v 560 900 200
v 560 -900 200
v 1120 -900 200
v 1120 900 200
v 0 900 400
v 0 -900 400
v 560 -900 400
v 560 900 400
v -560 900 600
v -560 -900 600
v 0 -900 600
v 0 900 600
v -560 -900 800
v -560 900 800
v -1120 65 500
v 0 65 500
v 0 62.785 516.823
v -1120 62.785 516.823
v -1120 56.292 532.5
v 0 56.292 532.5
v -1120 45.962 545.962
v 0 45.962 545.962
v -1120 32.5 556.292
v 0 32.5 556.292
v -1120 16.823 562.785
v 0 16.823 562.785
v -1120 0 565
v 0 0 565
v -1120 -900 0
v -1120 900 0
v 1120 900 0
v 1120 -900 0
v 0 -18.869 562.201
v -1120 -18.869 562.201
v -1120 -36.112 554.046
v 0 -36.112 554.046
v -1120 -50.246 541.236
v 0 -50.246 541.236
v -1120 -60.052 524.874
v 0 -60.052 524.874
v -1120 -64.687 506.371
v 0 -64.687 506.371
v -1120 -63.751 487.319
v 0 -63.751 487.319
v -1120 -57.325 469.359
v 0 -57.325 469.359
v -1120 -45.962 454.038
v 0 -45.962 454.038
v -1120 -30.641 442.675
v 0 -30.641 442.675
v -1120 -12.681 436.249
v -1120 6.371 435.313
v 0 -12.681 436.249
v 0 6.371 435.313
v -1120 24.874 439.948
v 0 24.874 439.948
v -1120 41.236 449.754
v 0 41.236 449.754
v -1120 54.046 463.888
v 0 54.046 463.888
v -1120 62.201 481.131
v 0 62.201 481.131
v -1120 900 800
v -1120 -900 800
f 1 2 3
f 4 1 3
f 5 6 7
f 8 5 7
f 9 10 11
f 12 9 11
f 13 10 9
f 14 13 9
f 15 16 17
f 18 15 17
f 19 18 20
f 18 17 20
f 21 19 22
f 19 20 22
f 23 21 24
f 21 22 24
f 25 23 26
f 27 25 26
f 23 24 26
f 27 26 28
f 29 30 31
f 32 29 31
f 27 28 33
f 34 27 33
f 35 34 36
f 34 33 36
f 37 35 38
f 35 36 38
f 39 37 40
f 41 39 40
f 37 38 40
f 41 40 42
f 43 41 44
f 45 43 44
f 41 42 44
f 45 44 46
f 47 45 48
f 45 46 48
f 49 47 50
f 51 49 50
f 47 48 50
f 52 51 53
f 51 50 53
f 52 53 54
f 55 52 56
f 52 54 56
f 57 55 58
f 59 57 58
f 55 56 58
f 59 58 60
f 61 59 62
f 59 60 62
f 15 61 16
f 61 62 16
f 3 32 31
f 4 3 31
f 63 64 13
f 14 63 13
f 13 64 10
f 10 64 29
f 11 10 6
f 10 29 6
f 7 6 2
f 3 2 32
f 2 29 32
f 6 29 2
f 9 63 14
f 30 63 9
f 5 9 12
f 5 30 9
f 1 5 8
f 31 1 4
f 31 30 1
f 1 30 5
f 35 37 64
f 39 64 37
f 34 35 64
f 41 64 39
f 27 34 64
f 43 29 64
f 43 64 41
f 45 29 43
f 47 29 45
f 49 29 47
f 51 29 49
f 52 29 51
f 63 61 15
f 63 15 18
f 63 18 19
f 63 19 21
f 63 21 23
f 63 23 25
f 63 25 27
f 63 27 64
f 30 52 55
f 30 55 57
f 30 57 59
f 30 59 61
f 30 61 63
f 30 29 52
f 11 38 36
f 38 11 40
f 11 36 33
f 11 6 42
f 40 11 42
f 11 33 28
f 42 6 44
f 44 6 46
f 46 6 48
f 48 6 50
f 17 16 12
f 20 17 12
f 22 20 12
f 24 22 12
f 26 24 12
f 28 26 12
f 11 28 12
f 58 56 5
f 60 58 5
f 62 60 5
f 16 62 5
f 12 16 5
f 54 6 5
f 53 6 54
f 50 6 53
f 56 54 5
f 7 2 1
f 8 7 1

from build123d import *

# Parameters (mm, degrees)
F0_W     = 2240
F0_H     = 1800
F1_DEPTH = 200
F2_W     = 1680
F2_H     = 1800
F3_DEPTH = 200
F4_W     = 1120
F4_H     = 1800
F5_DEPTH = 200
F6_W     = 560
F6_H     = 1800
F7_DEPTH = 200
F9_DEPTH = 1120


with BuildPart() as f1:
    # F0 (on Top) → F1 (new body)
    with BuildSketch(Plane.XY):
        Rectangle(F0_W, F0_H)
    extrude(amount=F1_DEPTH)

    # F2 (on face) → F3 (join)
    with BuildSketch(Plane.XY.offset(200)):
        with Locations((-280, 0)):
            Rectangle(F2_W, F2_H)
    extrude(amount=F3_DEPTH)

    # F4 (on face) → F5 (join)
    with BuildSketch(Plane.XY.offset(400)):
        with Locations((-560, 0)):
            Rectangle(F4_W, F4_H)
    extrude(amount=F5_DEPTH)

    # F6 (on face) → F7 (join)
    with BuildSketch(Plane.XY.offset(600)):
        with Locations((-840, 0)):
            Rectangle(F6_W, F6_H)
    extrude(amount=F7_DEPTH)

    # F8 (on face) → F9 (cut)
    with BuildSketch(Plane.YZ):
        with BuildLine():
            ThreePointArc((65, 500), (45.961941, 545.961941), (0, 565))
            Line((0, 565), (0, 500))
            Line((0, 500), (65, 500))
        make_face()
        with BuildLine():
            Line((0, 500), (0, 565))
            ThreePointArc((0, 565), (-45.961941, 454.038059), (65, 500))
            Line((65, 500), (0, 500))
        make_face()
    extrude(amount=-F9_DEPTH, mode=Mode.SUBTRACT)


solid = f1.part
